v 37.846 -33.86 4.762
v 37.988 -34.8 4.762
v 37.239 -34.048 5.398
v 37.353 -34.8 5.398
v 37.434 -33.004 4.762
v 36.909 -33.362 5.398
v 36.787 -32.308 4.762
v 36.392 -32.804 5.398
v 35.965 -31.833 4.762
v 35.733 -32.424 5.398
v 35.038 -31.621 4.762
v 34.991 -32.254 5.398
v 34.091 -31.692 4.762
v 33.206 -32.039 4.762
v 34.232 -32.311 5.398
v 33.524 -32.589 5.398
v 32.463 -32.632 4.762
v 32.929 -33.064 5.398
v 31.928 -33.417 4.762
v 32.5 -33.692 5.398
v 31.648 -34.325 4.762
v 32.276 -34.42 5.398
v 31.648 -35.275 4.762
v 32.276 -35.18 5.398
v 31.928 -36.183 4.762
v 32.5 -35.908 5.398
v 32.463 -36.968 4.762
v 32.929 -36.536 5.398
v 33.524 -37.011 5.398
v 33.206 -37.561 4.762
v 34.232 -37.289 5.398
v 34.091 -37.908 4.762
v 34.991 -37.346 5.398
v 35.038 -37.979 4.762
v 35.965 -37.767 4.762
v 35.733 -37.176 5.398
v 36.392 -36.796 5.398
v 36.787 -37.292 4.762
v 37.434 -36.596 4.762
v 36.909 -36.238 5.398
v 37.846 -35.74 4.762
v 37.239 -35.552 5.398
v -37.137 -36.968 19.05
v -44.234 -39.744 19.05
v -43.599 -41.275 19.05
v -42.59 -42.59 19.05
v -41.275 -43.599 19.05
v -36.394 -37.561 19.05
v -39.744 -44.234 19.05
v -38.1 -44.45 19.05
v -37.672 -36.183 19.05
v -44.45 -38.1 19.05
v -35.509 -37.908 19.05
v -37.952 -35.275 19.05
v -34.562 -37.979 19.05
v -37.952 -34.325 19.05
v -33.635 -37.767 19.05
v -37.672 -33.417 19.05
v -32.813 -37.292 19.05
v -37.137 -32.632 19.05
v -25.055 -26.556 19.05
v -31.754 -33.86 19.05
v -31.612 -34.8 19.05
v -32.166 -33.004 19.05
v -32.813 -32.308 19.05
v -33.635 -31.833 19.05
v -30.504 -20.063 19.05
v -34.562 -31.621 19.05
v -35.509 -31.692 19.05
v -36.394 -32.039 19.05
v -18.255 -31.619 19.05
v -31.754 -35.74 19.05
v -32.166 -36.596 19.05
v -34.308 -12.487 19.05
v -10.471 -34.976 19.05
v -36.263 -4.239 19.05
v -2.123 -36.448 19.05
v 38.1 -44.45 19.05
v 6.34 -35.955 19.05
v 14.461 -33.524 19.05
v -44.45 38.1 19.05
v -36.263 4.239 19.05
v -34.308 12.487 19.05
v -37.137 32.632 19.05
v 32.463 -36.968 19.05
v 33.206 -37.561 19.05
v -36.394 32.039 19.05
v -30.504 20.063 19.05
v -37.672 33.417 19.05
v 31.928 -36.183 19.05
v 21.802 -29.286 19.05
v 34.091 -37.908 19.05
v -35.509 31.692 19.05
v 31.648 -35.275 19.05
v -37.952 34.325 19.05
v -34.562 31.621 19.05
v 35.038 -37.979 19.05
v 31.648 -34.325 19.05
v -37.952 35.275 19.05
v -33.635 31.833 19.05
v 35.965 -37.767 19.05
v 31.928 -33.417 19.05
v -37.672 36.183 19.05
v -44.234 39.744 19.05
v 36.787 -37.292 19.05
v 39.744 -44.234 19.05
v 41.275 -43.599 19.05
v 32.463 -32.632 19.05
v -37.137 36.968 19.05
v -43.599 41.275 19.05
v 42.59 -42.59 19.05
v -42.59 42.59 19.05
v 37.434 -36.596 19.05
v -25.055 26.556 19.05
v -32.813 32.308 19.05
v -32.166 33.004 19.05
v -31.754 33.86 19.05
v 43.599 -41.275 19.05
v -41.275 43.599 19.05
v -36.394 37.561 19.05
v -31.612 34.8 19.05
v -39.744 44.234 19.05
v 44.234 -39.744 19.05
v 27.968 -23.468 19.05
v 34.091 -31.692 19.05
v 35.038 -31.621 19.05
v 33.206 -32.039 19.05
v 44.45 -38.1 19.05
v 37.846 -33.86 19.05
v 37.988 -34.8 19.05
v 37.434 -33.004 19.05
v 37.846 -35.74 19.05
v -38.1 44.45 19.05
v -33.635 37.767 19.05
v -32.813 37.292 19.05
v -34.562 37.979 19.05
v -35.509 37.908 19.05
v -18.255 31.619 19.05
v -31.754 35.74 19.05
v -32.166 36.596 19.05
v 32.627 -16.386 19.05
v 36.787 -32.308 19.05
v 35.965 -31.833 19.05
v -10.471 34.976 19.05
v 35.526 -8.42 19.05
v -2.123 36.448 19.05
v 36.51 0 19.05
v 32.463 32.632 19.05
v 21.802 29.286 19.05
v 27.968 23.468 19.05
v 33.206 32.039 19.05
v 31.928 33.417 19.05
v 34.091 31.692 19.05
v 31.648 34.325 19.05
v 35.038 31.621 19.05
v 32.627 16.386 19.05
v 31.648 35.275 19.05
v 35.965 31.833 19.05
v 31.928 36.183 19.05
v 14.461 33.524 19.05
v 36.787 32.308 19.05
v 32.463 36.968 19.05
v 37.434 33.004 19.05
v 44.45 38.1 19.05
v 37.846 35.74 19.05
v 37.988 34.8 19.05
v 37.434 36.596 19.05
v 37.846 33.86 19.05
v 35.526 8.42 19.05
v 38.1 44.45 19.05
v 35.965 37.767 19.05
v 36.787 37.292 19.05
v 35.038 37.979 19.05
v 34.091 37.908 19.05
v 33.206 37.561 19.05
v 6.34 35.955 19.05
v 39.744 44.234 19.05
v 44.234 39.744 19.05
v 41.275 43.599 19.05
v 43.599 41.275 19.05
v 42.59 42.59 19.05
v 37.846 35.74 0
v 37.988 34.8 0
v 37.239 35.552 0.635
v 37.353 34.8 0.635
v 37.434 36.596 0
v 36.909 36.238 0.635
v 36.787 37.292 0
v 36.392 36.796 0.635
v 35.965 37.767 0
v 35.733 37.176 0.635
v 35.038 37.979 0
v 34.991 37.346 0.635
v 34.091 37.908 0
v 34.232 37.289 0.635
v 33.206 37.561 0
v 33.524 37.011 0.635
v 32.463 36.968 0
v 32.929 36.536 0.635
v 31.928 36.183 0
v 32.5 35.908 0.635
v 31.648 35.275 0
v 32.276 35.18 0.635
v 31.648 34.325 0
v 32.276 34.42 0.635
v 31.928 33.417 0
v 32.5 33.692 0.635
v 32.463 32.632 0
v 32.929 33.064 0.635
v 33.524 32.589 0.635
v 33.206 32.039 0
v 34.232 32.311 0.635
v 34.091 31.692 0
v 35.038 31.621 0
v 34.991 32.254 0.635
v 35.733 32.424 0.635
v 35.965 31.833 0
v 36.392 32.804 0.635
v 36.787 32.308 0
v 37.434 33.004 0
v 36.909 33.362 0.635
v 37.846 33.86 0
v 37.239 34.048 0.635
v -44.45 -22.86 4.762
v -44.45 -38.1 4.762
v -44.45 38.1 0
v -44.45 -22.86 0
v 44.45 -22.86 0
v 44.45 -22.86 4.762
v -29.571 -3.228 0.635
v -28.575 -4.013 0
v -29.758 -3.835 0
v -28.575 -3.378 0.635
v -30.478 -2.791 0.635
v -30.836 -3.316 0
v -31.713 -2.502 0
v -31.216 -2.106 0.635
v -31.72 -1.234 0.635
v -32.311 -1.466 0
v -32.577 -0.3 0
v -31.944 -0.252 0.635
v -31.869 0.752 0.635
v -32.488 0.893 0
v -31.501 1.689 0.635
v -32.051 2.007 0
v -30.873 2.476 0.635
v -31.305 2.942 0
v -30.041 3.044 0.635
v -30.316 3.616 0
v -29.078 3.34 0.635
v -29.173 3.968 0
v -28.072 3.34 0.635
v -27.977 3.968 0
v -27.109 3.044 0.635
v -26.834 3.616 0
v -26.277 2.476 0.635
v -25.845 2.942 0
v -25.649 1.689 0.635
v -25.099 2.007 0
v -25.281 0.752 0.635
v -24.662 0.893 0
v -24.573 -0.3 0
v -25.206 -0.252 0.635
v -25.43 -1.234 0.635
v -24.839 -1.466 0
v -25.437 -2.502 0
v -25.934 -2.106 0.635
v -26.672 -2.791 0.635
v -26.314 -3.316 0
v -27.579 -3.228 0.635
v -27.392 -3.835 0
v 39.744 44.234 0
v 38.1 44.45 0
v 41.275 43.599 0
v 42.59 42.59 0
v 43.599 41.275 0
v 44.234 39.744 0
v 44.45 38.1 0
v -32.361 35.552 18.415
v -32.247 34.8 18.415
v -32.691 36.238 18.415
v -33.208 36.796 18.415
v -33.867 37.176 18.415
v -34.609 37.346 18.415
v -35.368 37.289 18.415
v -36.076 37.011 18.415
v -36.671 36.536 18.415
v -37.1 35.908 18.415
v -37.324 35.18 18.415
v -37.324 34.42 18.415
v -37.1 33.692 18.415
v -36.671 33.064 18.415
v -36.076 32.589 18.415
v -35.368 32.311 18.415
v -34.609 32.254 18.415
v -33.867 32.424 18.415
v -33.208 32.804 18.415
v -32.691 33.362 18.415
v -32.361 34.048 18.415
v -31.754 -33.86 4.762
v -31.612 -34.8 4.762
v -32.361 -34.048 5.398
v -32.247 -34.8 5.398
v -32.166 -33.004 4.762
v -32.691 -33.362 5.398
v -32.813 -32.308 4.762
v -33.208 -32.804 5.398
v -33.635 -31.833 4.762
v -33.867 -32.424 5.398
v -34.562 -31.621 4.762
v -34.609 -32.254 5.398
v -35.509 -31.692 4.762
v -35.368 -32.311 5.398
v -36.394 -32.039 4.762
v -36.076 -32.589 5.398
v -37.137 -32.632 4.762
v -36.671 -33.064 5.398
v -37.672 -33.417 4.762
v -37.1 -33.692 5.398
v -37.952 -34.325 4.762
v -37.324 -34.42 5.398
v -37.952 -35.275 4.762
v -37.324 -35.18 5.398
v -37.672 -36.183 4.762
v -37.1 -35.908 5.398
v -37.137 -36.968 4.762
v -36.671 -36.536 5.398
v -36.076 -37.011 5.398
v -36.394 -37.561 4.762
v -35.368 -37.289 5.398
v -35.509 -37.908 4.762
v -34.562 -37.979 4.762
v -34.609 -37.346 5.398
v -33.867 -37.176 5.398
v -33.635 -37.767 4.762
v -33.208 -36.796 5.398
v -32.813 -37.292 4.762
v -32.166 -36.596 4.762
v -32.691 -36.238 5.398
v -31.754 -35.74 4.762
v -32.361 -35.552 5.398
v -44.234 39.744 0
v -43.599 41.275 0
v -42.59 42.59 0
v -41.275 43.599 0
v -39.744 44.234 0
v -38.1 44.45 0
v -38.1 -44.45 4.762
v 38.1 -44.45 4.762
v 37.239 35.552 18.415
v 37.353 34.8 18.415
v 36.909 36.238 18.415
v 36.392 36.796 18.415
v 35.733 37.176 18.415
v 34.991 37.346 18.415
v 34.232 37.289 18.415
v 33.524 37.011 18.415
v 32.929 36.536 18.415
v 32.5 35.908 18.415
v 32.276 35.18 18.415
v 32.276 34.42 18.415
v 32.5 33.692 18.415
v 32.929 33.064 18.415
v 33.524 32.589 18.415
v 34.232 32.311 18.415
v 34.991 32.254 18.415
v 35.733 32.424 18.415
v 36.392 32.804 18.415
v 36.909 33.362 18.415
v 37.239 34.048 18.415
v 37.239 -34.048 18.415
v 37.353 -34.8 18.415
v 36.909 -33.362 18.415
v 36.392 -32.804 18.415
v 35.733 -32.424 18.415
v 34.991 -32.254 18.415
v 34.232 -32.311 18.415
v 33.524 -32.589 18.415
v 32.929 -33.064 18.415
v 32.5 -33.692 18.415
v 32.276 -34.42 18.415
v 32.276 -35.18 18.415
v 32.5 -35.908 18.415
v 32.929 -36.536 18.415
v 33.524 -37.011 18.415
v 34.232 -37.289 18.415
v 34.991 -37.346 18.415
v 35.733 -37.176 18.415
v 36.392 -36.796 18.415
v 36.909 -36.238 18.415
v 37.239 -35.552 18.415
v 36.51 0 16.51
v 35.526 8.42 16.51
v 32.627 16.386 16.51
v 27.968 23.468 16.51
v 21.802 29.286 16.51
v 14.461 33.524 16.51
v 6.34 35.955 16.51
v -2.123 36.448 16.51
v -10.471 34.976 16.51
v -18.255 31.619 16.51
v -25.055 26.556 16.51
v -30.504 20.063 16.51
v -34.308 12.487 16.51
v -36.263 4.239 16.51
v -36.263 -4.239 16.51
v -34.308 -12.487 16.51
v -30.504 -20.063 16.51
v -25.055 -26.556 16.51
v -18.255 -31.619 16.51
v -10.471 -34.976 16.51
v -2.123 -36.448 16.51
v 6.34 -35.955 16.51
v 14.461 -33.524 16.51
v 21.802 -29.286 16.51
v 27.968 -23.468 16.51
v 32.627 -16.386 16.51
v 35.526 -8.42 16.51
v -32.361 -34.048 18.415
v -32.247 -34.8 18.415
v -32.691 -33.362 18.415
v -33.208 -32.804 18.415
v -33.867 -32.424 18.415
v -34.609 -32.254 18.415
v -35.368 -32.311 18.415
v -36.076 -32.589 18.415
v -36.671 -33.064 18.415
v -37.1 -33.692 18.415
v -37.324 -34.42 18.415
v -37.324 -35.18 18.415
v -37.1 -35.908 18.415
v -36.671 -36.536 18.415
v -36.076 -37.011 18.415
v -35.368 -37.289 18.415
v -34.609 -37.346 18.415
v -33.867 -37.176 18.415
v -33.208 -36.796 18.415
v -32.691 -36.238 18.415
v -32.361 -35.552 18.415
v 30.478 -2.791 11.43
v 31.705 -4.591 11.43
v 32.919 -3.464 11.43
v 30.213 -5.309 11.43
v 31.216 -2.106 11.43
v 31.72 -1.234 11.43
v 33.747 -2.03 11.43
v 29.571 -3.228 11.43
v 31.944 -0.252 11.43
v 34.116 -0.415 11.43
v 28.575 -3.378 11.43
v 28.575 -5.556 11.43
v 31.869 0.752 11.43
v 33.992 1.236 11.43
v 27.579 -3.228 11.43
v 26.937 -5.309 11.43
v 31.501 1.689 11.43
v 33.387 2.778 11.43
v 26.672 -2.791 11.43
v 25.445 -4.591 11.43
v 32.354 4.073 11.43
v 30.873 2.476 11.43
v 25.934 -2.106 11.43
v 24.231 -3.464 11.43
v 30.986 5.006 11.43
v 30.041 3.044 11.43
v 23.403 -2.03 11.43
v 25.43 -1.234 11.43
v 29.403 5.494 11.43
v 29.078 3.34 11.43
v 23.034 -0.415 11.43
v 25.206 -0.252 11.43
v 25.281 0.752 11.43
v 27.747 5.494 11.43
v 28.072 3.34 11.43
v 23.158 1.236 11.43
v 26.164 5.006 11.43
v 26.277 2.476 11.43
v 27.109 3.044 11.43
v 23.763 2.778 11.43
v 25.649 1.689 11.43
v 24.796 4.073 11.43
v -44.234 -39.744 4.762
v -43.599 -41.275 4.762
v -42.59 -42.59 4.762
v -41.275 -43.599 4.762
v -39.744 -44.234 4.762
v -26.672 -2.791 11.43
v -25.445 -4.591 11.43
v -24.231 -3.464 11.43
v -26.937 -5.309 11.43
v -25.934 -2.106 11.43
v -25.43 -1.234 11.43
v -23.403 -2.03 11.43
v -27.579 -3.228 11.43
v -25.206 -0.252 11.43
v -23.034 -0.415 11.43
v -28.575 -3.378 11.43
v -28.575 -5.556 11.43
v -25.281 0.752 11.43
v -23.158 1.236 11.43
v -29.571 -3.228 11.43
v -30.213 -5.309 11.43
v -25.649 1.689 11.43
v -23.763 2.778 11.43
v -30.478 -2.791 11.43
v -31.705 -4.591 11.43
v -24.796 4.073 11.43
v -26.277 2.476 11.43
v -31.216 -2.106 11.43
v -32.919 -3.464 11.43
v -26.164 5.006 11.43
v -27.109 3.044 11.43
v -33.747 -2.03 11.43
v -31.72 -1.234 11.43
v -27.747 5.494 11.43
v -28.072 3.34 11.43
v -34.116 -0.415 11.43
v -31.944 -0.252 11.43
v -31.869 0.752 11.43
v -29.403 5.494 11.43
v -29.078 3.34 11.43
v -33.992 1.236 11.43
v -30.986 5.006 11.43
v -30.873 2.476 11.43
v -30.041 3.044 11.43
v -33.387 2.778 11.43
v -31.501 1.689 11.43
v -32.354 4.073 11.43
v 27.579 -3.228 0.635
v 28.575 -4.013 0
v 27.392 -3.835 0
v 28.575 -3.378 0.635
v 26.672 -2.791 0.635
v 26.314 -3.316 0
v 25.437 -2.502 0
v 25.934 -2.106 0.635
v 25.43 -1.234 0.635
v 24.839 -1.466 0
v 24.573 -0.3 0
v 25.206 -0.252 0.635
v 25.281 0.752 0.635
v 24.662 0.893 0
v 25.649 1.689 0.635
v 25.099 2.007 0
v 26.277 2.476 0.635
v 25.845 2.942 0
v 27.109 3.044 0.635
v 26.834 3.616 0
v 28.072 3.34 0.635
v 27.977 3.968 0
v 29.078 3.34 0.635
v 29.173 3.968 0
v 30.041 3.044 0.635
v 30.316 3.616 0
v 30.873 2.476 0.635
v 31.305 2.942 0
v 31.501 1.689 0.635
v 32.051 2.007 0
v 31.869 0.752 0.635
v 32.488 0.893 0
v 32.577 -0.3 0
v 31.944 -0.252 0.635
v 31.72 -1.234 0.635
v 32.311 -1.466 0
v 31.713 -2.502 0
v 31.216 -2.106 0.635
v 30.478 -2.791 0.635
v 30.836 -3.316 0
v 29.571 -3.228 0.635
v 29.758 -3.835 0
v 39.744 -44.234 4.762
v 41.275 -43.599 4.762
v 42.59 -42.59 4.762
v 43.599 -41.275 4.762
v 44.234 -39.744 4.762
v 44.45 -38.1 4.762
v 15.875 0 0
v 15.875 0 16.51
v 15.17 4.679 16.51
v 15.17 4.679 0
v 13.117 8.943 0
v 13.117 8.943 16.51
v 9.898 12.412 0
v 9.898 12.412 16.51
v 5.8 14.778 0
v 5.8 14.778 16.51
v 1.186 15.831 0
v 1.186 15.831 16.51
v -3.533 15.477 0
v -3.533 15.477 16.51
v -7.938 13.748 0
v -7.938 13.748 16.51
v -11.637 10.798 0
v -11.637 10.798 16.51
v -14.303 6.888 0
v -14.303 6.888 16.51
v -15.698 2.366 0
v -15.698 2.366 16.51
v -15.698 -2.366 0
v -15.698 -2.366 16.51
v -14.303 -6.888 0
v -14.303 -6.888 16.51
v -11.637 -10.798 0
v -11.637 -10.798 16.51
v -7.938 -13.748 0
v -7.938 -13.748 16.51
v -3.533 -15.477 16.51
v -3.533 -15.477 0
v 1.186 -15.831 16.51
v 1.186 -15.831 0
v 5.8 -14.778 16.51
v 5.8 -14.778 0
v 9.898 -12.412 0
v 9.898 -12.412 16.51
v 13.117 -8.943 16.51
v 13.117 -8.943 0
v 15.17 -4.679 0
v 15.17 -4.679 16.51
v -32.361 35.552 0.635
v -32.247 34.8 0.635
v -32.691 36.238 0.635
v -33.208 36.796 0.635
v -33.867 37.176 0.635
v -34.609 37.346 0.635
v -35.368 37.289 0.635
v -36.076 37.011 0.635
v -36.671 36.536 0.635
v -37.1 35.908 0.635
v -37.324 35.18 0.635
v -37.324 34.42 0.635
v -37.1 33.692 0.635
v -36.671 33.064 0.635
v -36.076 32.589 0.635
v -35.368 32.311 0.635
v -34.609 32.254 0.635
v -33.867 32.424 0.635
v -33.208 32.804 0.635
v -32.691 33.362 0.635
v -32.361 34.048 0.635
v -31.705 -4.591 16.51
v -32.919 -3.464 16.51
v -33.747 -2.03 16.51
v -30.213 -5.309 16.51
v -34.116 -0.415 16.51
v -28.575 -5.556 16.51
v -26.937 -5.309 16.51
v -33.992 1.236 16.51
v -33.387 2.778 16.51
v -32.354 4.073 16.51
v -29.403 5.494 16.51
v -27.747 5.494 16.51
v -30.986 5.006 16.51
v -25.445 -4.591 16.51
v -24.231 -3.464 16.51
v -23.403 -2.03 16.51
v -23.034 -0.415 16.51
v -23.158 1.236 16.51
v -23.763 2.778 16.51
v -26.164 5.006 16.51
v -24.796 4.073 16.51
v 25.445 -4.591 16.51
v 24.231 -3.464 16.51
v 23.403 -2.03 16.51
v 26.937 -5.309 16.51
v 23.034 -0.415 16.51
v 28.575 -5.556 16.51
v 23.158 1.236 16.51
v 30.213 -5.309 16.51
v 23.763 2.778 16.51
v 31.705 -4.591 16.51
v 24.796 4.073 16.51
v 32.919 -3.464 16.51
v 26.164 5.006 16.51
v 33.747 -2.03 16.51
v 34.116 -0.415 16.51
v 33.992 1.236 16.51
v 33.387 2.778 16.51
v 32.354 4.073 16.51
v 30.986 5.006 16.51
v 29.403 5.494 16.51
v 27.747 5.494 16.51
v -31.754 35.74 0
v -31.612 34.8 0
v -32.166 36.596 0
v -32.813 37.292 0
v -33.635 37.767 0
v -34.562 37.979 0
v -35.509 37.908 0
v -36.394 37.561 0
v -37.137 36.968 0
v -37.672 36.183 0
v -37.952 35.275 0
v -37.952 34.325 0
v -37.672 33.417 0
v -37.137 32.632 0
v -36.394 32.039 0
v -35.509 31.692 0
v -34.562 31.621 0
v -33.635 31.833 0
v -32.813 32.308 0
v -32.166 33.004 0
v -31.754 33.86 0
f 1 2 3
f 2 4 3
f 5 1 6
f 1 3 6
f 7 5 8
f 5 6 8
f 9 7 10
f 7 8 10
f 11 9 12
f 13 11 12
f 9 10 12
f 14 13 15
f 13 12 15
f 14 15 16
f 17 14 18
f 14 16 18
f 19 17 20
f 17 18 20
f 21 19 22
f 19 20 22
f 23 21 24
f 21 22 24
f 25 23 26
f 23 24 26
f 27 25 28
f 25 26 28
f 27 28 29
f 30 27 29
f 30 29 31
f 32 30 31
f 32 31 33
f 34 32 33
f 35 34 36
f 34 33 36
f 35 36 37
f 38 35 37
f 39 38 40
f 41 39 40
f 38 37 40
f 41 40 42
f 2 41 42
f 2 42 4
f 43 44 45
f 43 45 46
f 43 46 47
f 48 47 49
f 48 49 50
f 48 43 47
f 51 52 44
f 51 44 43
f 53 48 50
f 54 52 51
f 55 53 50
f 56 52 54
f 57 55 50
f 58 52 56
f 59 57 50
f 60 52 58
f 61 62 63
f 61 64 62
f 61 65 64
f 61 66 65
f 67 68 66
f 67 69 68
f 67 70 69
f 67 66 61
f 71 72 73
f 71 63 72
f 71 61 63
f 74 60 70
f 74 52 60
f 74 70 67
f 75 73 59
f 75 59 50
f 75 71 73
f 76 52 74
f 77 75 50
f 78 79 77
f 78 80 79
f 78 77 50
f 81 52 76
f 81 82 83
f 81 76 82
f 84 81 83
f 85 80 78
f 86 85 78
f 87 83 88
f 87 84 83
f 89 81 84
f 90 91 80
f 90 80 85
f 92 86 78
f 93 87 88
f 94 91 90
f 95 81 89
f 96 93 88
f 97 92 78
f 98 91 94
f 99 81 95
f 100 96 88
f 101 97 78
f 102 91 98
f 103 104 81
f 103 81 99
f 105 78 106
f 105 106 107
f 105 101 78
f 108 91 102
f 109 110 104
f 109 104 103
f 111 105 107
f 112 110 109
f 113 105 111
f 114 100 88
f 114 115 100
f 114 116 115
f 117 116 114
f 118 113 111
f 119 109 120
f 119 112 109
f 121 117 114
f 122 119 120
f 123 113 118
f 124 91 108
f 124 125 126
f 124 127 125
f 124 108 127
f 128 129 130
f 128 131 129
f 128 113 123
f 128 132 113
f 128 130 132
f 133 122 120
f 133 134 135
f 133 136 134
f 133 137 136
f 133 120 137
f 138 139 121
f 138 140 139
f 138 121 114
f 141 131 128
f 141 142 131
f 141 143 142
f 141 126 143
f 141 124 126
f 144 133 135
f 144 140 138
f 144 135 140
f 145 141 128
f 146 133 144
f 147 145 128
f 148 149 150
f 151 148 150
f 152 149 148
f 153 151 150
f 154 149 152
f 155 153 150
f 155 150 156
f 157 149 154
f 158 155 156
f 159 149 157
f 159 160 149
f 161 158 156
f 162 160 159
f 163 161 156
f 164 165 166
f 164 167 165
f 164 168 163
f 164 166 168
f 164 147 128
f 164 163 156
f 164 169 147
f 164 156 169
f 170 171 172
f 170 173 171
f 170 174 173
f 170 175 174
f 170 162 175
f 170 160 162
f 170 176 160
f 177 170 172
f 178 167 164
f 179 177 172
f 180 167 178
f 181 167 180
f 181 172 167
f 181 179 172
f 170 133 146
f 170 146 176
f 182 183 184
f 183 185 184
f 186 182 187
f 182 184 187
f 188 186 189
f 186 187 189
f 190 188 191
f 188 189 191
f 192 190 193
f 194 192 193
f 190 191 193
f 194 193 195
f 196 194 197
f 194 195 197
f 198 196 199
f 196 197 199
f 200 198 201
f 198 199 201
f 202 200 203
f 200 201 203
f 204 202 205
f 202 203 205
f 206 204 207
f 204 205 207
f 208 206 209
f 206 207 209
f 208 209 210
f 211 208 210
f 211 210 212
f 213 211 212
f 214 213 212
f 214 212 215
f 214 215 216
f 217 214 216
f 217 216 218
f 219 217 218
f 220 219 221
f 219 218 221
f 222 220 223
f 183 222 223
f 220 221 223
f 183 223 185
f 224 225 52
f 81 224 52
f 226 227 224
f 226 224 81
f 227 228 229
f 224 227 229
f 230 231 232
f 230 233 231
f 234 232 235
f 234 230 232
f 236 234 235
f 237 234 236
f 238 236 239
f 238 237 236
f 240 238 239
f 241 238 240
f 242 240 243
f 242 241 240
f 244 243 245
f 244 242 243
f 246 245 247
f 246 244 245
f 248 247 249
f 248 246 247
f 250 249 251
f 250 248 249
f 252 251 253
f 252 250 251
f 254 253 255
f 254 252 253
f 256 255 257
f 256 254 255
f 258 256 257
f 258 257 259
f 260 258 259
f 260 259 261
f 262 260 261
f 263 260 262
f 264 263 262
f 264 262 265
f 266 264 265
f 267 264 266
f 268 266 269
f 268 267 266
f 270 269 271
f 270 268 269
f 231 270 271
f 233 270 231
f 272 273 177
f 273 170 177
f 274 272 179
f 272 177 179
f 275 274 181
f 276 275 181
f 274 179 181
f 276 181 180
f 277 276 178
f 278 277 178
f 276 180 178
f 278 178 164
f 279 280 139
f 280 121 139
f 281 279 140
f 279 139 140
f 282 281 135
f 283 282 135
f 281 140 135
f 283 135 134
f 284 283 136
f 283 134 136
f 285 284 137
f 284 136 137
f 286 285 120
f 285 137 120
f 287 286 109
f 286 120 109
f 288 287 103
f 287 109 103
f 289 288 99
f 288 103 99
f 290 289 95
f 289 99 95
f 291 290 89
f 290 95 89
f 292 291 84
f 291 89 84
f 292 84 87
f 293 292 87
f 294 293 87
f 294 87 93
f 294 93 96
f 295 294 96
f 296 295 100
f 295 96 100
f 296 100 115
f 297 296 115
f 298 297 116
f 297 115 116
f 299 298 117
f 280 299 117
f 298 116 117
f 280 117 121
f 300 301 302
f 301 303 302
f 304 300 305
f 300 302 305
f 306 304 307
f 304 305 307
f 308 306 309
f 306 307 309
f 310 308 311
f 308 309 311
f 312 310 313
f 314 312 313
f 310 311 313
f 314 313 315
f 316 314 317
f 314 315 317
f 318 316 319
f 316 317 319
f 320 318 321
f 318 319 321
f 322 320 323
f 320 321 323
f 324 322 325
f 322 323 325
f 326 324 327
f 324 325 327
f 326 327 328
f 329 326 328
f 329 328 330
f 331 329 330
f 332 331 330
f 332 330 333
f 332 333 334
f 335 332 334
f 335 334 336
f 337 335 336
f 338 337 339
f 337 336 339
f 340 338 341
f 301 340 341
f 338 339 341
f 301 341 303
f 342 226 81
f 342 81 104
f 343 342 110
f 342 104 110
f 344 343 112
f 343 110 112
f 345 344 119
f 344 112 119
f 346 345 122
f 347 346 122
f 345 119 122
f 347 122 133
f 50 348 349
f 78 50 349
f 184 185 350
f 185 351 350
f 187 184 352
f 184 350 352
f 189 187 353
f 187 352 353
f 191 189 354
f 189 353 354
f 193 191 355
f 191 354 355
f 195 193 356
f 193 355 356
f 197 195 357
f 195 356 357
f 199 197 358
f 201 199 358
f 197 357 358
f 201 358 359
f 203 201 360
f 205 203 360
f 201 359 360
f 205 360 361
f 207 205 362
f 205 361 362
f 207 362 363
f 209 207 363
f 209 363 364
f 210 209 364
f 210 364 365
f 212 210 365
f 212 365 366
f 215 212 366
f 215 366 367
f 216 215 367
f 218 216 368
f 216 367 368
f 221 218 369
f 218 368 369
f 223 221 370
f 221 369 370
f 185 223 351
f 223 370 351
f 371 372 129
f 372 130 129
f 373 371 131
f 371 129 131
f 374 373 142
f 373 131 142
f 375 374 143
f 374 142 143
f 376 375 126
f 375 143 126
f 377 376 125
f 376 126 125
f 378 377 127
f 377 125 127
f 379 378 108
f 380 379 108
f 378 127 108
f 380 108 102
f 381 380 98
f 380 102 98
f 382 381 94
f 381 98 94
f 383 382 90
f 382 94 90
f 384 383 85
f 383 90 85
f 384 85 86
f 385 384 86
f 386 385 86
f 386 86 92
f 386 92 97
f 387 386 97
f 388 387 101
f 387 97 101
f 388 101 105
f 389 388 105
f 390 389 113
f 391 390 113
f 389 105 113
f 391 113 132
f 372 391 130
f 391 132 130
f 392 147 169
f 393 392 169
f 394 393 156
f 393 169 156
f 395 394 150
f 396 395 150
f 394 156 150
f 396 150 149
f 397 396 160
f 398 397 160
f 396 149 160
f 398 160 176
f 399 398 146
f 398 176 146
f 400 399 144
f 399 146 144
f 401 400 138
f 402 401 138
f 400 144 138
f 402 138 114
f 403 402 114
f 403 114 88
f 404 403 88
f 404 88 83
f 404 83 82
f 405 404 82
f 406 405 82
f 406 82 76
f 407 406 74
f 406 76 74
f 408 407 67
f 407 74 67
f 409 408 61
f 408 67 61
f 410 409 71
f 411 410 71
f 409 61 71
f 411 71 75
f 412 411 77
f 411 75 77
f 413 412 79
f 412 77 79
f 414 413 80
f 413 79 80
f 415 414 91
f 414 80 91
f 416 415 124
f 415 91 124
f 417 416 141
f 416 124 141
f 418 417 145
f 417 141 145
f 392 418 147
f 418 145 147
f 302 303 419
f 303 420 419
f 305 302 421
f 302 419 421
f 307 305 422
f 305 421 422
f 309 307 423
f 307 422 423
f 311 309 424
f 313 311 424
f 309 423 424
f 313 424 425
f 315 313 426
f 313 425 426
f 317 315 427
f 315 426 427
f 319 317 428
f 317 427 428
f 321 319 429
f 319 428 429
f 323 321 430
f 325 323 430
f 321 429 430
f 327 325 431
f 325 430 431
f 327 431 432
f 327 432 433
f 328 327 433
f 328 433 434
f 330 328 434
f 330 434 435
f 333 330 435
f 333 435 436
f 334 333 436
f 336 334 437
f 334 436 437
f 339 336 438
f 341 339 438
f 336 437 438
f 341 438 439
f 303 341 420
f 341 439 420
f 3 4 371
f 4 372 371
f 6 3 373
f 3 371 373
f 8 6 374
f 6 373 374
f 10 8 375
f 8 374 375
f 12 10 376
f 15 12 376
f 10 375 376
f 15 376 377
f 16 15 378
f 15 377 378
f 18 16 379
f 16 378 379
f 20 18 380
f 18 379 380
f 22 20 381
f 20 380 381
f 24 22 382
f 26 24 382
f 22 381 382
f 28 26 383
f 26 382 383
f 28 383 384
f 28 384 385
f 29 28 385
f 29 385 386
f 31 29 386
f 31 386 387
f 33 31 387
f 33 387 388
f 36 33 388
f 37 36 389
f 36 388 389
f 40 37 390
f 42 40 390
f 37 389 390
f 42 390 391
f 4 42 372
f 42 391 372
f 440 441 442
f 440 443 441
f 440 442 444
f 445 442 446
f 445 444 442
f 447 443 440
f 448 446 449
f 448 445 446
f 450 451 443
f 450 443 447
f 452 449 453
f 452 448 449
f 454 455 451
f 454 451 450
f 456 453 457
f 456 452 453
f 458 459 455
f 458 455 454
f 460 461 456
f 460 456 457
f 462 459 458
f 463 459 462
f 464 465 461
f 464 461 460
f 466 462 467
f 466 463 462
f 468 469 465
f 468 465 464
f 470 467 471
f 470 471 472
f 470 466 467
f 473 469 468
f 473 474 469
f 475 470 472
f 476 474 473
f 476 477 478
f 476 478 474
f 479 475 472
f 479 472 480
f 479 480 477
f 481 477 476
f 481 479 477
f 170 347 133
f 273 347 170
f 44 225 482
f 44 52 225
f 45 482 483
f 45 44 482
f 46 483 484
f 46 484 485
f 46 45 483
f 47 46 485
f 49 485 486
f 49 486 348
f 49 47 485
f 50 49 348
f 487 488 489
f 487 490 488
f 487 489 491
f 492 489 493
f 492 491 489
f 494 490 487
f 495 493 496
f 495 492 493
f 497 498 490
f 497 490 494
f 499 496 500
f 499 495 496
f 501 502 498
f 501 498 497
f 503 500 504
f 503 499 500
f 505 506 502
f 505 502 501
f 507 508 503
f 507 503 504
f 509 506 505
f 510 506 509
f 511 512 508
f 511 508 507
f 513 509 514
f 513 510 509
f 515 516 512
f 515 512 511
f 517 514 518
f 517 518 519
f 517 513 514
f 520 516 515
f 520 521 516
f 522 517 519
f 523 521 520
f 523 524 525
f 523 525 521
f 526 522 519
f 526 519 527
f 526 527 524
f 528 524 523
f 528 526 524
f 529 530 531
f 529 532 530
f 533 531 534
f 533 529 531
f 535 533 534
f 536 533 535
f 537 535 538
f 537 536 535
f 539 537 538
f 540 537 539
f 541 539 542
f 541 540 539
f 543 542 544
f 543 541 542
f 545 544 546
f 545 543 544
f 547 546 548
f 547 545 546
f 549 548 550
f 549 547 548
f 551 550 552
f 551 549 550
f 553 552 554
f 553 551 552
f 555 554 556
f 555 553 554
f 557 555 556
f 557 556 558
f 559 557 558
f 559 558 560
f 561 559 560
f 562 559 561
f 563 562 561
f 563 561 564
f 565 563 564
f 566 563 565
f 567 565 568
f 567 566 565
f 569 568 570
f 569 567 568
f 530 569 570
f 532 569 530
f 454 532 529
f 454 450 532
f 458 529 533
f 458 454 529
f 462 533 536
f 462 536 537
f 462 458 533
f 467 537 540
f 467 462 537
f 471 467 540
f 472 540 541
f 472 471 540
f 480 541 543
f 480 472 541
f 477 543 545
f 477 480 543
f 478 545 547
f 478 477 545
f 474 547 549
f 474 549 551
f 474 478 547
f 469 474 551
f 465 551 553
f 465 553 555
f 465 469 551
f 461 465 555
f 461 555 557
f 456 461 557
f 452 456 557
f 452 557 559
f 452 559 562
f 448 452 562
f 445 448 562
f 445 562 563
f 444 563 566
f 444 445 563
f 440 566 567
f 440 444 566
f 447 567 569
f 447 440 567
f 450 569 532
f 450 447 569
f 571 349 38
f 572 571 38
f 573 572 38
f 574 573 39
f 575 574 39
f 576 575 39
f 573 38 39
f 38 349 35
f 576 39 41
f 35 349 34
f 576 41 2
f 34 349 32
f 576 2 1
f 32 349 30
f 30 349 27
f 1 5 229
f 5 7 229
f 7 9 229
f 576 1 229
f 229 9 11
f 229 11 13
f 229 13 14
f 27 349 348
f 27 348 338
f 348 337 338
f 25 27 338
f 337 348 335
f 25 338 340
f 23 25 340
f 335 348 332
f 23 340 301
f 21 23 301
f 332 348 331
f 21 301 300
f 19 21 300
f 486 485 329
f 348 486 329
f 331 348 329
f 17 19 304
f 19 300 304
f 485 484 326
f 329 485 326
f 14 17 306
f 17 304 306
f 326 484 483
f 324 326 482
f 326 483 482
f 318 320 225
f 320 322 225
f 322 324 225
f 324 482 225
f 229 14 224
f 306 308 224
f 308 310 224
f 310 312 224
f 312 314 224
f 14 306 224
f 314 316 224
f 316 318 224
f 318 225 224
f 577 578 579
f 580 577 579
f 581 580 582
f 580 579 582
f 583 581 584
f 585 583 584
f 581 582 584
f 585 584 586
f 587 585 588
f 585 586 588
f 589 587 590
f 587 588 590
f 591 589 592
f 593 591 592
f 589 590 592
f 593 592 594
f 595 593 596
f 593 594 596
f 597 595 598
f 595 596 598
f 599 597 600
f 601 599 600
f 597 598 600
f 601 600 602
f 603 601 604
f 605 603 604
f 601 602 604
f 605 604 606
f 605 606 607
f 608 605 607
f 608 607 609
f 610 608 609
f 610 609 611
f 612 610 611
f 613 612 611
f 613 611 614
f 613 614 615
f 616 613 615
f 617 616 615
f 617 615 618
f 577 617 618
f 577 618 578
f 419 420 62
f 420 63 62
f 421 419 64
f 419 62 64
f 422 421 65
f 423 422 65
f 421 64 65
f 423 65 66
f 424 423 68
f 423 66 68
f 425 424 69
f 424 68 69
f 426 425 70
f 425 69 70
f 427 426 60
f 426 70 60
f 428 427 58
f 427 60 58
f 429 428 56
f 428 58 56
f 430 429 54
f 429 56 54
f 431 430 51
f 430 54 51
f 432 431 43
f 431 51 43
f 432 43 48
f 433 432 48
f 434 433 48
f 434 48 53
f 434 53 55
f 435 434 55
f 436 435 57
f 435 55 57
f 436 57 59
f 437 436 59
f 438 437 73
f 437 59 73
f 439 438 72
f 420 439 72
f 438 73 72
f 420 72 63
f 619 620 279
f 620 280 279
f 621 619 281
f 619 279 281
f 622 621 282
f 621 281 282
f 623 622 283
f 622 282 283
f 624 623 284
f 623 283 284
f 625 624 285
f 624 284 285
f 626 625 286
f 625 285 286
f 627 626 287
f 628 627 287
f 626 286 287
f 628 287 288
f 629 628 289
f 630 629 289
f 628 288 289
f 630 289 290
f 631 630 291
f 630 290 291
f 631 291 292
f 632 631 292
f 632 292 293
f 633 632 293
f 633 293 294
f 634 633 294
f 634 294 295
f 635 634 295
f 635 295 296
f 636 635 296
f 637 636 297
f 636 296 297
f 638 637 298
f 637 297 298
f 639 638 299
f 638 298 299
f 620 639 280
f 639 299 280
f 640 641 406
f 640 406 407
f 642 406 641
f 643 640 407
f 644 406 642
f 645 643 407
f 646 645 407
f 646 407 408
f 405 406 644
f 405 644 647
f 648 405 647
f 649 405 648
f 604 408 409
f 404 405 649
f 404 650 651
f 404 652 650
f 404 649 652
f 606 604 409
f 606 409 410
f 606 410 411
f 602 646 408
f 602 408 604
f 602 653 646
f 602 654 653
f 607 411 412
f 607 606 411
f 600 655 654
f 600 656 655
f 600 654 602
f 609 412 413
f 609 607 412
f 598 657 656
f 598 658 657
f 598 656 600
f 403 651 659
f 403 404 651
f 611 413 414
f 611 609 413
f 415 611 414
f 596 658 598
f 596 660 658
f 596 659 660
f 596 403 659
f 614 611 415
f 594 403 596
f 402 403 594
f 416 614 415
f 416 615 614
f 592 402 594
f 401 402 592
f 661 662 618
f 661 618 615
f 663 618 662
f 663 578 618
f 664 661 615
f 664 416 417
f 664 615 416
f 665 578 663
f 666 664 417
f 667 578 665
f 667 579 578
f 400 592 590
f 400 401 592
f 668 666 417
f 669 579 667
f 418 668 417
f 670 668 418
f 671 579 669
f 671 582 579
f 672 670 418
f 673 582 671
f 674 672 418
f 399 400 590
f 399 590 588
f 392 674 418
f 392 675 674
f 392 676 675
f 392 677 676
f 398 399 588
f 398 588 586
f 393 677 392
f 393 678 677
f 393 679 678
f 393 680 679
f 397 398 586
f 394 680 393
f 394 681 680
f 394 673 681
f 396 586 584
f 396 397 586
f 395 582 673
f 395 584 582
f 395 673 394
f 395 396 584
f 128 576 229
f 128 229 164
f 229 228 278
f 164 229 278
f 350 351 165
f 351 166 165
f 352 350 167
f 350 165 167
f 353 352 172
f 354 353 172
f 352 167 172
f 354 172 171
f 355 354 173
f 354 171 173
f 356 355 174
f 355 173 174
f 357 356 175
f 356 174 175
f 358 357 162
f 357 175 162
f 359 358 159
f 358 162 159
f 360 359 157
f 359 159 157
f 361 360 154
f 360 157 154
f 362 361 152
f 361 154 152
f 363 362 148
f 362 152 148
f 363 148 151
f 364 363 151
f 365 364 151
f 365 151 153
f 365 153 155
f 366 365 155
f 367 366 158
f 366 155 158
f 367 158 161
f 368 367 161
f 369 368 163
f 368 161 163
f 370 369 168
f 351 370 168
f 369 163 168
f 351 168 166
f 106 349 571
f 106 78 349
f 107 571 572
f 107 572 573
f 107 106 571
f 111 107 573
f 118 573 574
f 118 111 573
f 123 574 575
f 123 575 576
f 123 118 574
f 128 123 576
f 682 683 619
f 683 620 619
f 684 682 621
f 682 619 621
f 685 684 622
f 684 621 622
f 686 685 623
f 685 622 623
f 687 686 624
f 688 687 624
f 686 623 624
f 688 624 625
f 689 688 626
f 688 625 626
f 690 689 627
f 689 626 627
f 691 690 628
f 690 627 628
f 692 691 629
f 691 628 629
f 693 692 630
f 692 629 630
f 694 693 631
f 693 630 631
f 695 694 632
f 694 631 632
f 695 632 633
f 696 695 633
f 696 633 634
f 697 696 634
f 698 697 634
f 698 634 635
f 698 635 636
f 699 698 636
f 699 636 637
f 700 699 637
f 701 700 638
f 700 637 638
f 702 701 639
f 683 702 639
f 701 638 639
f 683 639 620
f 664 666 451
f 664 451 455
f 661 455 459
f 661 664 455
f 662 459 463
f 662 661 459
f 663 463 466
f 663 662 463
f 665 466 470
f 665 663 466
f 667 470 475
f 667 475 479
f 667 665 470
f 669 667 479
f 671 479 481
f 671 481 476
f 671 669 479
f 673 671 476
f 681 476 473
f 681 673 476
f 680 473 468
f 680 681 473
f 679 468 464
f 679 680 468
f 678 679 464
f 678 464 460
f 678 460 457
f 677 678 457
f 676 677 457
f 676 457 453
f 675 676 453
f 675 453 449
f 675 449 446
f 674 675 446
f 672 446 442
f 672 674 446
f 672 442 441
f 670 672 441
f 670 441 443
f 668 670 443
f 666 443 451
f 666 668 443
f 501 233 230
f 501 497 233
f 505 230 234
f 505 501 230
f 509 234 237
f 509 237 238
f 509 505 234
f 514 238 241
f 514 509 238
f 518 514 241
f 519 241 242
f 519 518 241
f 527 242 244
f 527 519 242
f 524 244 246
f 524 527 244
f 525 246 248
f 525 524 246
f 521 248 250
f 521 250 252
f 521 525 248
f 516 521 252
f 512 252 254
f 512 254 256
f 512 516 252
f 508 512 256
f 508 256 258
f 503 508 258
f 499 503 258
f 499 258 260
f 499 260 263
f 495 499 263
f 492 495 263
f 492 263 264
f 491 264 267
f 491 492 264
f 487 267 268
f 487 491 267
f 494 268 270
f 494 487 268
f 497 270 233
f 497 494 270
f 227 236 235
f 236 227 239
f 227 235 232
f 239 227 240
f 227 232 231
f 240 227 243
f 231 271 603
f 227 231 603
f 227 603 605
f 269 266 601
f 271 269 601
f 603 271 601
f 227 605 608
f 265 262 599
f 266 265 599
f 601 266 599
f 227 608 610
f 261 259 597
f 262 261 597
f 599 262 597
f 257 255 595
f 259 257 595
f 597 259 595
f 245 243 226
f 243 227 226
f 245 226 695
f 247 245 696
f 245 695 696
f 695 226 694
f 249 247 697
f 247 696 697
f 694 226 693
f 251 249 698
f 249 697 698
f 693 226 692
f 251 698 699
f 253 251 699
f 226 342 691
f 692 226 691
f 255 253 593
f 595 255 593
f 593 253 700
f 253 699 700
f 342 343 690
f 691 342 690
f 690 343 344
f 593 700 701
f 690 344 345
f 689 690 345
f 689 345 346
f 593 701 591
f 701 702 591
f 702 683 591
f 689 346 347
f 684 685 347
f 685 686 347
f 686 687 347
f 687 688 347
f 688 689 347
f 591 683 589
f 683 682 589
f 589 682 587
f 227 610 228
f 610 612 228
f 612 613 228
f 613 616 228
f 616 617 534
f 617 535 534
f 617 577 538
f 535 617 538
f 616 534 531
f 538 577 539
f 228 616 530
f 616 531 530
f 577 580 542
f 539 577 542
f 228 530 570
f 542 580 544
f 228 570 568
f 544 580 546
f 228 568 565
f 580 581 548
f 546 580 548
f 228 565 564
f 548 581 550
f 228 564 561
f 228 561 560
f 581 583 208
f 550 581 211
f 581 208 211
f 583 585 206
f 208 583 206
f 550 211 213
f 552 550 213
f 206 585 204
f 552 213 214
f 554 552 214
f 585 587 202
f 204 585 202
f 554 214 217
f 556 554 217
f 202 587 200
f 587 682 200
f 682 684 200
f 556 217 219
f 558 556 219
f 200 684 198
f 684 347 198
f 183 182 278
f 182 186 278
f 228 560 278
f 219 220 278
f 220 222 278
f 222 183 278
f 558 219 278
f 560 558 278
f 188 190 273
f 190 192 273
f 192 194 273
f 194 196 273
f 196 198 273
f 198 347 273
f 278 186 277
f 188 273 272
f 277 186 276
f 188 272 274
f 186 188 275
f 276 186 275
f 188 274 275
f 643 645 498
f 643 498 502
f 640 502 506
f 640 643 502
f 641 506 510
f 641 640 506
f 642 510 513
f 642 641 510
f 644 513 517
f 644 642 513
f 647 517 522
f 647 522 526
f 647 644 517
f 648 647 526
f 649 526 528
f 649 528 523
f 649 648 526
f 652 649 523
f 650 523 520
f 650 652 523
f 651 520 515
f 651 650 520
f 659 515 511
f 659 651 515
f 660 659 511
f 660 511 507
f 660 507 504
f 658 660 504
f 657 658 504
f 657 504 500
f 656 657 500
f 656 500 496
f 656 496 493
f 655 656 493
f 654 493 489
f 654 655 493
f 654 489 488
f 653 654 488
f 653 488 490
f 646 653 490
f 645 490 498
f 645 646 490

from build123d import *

# Parameters (mm, degrees)
SKETCH1_W                                     = 88.9
SKETCH1_H                                     = 88.9
BOSS_EXTRUDE1_DEPTH                           = 19.05
SKETCH2_R                                     = 36.51
CUT_EXTRUDE1_DEPTH                            = 2.54
SKETCH5_R                                     = 15.875
CUT_EXTRUDE3_DEPTH                            = 65.993731236
SKETCH4_W                                     = 4.7625
SKETCH4_H                                     = 21.59
CUT_EXTRUDE2_DEPTH                            = 102.202346811
FILLET1_R                                     = 6.35
CBORE_FOR_1_4_SOCKET_HEAD_CAP_SCREW1_AT_COUNT = 2
CBORE_FOR_1_4_SOCKET_HEAD_CAP_SCREW1_AT_PITCH = 57.15


# Read off the part's stored shape, not the designer's step: 1/4-20 Tapped Hole2
with BuildPart() as part:
    # Sketch1 → Boss-Extrude1 (new body)
    with BuildSketch(Plane.XY):
        Rectangle(SKETCH1_W, SKETCH1_H)
    extrude(amount=BOSS_EXTRUDE1_DEPTH)

    # Sketch2 → Cut-Extrude1 (cut)
    with BuildSketch(Plane.XY.offset(19.05)):
        Circle(SKETCH2_R)
    extrude(amount=-CUT_EXTRUDE1_DEPTH, mode=Mode.SUBTRACT)

    # Sketch5 → Cut-Extrude3 (cut, through all)
    with BuildSketch(Plane.XY.offset(16.51)):
        Circle(SKETCH5_R)
    extrude(amount=-CUT_EXTRUDE3_DEPTH, mode=Mode.SUBTRACT)

    # Sketch4 → Cut-Extrude2 (cut, through all)
    with BuildSketch(Plane.ZY.offset(44.45)):
        with Locations((2.38125, -33.655)):
            Rectangle(SKETCH4_W, SKETCH4_H)
    extrude(amount=-CUT_EXTRUDE2_DEPTH, mode=Mode.SUBTRACT)

    # Fillet1
    fillet1_edges = [part.edges().sort_by_distance(p)[0] for p in [
        (44.45, -44.45, 11.90625),
        (-44.45, -44.45, 11.90625),
        (-44.45, 44.45, 9.525),
        (44.45, 44.45, 9.525),
    ]]
    fillet(fillet1_edges, radius=FILLET1_R)

    # 1/4-20 Tapped Hole2 outline → 1/4-20 Tapped Hole2 (revolve, cut)
    with BuildSketch(Plane(origin=(34.8, 34.8, 0), x_dir=(1, 0, 0), z_dir=(0, -1, 0))):
        Polygon((0, 0), (3.1877, 0), (2.5527, 0.635), (2.5527, 18.415), (3.1877, 19.05), (0, 19.05), align=None)
    revolve(axis=Axis((34.8, 34.8, 0), (0, 0, 1)), mode=Mode.SUBTRACT)

    # 1_4-20 Tapped Hole2 2 outline → 1_4-20 Tapped Hole2 2 (revolve, cut)
    with BuildSketch(Plane(origin=(-34.8, -34.8, 0), x_dir=(1, 0, 0), z_dir=(0, -1, 0))):
        Polygon((0, 4.7625), (3.1877, 4.7625), (2.5527, 5.3975), (2.5527, 18.415), (3.1877, 19.05), (0, 19.05), align=None)
    revolve(axis=Axis((-34.8, -34.8, 0), (0, 0, 1)), mode=Mode.SUBTRACT)

    # 1_4-20 Tapped Hole2 3 outline → 1_4-20 Tapped Hole2 3 (revolve, cut)
    with BuildSketch(Plane(origin=(-34.8, 34.8, 0), x_dir=(1, 0, 0), z_dir=(0, -1, 0))):
        Polygon((0, 0), (3.1877, 0), (2.5527, 0.635), (2.5527, 18.415), (3.1877, 19.05), (0, 19.05), align=None)
    revolve(axis=Axis((-34.8, 34.8, 0), (0, 0, 1)), mode=Mode.SUBTRACT)

    # 1_4-20 Tapped Hole2 4 outline → 1_4-20 Tapped Hole2 4 (revolve, cut)
    with BuildSketch(Plane(origin=(34.8, -34.8, 0), x_dir=(1, 0, 0), z_dir=(0, -1, 0))):
        Polygon((0, 4.7625), (3.1877, 4.7625), (2.5527, 5.3975), (2.5527, 18.415), (3.1877, 19.05), (0, 19.05), align=None)
    revolve(axis=Axis((34.8, -34.8, 0), (0, 0, 1)), mode=Mode.SUBTRACT)

    # Sketch9 → CBORE for 1/4 Socket Head Cap Screw1 (revolve, cut)
    with BuildSketch(Plane(origin=(28.575, 0, 19.05), x_dir=(0, -1, 0), z_dir=(1, 0, 0))):
        Polygon((0, 0), (0, 19.05), (4.0132, 19.05), (3.3782, 18.415), (3.3782, 7.62), (5.55625, 7.62), (5.55625, 0.635), (6.19125, 0), align=None)
    cbore_for_1_4_socket_head_cap_screw1 = revolve(axis=Axis((28.575, 0, 25.4), (0, 0, -1)), mode=Mode.SUBTRACT)

    # CBORE for 1/4 Socket Head Cap Screw1 at: CBORE for 1/4 Socket Head Cap Screw1 ×2
    with Locations(*[(-i * CBORE_FOR_1_4_SOCKET_HEAD_CAP_SCREW1_AT_PITCH, 0, 0) for i in range(1, CBORE_FOR_1_4_SOCKET_HEAD_CAP_SCREW1_AT_COUNT)]):
        add(cbore_for_1_4_socket_head_cap_screw1, mode=Mode.SUBTRACT)


solid = part.part
